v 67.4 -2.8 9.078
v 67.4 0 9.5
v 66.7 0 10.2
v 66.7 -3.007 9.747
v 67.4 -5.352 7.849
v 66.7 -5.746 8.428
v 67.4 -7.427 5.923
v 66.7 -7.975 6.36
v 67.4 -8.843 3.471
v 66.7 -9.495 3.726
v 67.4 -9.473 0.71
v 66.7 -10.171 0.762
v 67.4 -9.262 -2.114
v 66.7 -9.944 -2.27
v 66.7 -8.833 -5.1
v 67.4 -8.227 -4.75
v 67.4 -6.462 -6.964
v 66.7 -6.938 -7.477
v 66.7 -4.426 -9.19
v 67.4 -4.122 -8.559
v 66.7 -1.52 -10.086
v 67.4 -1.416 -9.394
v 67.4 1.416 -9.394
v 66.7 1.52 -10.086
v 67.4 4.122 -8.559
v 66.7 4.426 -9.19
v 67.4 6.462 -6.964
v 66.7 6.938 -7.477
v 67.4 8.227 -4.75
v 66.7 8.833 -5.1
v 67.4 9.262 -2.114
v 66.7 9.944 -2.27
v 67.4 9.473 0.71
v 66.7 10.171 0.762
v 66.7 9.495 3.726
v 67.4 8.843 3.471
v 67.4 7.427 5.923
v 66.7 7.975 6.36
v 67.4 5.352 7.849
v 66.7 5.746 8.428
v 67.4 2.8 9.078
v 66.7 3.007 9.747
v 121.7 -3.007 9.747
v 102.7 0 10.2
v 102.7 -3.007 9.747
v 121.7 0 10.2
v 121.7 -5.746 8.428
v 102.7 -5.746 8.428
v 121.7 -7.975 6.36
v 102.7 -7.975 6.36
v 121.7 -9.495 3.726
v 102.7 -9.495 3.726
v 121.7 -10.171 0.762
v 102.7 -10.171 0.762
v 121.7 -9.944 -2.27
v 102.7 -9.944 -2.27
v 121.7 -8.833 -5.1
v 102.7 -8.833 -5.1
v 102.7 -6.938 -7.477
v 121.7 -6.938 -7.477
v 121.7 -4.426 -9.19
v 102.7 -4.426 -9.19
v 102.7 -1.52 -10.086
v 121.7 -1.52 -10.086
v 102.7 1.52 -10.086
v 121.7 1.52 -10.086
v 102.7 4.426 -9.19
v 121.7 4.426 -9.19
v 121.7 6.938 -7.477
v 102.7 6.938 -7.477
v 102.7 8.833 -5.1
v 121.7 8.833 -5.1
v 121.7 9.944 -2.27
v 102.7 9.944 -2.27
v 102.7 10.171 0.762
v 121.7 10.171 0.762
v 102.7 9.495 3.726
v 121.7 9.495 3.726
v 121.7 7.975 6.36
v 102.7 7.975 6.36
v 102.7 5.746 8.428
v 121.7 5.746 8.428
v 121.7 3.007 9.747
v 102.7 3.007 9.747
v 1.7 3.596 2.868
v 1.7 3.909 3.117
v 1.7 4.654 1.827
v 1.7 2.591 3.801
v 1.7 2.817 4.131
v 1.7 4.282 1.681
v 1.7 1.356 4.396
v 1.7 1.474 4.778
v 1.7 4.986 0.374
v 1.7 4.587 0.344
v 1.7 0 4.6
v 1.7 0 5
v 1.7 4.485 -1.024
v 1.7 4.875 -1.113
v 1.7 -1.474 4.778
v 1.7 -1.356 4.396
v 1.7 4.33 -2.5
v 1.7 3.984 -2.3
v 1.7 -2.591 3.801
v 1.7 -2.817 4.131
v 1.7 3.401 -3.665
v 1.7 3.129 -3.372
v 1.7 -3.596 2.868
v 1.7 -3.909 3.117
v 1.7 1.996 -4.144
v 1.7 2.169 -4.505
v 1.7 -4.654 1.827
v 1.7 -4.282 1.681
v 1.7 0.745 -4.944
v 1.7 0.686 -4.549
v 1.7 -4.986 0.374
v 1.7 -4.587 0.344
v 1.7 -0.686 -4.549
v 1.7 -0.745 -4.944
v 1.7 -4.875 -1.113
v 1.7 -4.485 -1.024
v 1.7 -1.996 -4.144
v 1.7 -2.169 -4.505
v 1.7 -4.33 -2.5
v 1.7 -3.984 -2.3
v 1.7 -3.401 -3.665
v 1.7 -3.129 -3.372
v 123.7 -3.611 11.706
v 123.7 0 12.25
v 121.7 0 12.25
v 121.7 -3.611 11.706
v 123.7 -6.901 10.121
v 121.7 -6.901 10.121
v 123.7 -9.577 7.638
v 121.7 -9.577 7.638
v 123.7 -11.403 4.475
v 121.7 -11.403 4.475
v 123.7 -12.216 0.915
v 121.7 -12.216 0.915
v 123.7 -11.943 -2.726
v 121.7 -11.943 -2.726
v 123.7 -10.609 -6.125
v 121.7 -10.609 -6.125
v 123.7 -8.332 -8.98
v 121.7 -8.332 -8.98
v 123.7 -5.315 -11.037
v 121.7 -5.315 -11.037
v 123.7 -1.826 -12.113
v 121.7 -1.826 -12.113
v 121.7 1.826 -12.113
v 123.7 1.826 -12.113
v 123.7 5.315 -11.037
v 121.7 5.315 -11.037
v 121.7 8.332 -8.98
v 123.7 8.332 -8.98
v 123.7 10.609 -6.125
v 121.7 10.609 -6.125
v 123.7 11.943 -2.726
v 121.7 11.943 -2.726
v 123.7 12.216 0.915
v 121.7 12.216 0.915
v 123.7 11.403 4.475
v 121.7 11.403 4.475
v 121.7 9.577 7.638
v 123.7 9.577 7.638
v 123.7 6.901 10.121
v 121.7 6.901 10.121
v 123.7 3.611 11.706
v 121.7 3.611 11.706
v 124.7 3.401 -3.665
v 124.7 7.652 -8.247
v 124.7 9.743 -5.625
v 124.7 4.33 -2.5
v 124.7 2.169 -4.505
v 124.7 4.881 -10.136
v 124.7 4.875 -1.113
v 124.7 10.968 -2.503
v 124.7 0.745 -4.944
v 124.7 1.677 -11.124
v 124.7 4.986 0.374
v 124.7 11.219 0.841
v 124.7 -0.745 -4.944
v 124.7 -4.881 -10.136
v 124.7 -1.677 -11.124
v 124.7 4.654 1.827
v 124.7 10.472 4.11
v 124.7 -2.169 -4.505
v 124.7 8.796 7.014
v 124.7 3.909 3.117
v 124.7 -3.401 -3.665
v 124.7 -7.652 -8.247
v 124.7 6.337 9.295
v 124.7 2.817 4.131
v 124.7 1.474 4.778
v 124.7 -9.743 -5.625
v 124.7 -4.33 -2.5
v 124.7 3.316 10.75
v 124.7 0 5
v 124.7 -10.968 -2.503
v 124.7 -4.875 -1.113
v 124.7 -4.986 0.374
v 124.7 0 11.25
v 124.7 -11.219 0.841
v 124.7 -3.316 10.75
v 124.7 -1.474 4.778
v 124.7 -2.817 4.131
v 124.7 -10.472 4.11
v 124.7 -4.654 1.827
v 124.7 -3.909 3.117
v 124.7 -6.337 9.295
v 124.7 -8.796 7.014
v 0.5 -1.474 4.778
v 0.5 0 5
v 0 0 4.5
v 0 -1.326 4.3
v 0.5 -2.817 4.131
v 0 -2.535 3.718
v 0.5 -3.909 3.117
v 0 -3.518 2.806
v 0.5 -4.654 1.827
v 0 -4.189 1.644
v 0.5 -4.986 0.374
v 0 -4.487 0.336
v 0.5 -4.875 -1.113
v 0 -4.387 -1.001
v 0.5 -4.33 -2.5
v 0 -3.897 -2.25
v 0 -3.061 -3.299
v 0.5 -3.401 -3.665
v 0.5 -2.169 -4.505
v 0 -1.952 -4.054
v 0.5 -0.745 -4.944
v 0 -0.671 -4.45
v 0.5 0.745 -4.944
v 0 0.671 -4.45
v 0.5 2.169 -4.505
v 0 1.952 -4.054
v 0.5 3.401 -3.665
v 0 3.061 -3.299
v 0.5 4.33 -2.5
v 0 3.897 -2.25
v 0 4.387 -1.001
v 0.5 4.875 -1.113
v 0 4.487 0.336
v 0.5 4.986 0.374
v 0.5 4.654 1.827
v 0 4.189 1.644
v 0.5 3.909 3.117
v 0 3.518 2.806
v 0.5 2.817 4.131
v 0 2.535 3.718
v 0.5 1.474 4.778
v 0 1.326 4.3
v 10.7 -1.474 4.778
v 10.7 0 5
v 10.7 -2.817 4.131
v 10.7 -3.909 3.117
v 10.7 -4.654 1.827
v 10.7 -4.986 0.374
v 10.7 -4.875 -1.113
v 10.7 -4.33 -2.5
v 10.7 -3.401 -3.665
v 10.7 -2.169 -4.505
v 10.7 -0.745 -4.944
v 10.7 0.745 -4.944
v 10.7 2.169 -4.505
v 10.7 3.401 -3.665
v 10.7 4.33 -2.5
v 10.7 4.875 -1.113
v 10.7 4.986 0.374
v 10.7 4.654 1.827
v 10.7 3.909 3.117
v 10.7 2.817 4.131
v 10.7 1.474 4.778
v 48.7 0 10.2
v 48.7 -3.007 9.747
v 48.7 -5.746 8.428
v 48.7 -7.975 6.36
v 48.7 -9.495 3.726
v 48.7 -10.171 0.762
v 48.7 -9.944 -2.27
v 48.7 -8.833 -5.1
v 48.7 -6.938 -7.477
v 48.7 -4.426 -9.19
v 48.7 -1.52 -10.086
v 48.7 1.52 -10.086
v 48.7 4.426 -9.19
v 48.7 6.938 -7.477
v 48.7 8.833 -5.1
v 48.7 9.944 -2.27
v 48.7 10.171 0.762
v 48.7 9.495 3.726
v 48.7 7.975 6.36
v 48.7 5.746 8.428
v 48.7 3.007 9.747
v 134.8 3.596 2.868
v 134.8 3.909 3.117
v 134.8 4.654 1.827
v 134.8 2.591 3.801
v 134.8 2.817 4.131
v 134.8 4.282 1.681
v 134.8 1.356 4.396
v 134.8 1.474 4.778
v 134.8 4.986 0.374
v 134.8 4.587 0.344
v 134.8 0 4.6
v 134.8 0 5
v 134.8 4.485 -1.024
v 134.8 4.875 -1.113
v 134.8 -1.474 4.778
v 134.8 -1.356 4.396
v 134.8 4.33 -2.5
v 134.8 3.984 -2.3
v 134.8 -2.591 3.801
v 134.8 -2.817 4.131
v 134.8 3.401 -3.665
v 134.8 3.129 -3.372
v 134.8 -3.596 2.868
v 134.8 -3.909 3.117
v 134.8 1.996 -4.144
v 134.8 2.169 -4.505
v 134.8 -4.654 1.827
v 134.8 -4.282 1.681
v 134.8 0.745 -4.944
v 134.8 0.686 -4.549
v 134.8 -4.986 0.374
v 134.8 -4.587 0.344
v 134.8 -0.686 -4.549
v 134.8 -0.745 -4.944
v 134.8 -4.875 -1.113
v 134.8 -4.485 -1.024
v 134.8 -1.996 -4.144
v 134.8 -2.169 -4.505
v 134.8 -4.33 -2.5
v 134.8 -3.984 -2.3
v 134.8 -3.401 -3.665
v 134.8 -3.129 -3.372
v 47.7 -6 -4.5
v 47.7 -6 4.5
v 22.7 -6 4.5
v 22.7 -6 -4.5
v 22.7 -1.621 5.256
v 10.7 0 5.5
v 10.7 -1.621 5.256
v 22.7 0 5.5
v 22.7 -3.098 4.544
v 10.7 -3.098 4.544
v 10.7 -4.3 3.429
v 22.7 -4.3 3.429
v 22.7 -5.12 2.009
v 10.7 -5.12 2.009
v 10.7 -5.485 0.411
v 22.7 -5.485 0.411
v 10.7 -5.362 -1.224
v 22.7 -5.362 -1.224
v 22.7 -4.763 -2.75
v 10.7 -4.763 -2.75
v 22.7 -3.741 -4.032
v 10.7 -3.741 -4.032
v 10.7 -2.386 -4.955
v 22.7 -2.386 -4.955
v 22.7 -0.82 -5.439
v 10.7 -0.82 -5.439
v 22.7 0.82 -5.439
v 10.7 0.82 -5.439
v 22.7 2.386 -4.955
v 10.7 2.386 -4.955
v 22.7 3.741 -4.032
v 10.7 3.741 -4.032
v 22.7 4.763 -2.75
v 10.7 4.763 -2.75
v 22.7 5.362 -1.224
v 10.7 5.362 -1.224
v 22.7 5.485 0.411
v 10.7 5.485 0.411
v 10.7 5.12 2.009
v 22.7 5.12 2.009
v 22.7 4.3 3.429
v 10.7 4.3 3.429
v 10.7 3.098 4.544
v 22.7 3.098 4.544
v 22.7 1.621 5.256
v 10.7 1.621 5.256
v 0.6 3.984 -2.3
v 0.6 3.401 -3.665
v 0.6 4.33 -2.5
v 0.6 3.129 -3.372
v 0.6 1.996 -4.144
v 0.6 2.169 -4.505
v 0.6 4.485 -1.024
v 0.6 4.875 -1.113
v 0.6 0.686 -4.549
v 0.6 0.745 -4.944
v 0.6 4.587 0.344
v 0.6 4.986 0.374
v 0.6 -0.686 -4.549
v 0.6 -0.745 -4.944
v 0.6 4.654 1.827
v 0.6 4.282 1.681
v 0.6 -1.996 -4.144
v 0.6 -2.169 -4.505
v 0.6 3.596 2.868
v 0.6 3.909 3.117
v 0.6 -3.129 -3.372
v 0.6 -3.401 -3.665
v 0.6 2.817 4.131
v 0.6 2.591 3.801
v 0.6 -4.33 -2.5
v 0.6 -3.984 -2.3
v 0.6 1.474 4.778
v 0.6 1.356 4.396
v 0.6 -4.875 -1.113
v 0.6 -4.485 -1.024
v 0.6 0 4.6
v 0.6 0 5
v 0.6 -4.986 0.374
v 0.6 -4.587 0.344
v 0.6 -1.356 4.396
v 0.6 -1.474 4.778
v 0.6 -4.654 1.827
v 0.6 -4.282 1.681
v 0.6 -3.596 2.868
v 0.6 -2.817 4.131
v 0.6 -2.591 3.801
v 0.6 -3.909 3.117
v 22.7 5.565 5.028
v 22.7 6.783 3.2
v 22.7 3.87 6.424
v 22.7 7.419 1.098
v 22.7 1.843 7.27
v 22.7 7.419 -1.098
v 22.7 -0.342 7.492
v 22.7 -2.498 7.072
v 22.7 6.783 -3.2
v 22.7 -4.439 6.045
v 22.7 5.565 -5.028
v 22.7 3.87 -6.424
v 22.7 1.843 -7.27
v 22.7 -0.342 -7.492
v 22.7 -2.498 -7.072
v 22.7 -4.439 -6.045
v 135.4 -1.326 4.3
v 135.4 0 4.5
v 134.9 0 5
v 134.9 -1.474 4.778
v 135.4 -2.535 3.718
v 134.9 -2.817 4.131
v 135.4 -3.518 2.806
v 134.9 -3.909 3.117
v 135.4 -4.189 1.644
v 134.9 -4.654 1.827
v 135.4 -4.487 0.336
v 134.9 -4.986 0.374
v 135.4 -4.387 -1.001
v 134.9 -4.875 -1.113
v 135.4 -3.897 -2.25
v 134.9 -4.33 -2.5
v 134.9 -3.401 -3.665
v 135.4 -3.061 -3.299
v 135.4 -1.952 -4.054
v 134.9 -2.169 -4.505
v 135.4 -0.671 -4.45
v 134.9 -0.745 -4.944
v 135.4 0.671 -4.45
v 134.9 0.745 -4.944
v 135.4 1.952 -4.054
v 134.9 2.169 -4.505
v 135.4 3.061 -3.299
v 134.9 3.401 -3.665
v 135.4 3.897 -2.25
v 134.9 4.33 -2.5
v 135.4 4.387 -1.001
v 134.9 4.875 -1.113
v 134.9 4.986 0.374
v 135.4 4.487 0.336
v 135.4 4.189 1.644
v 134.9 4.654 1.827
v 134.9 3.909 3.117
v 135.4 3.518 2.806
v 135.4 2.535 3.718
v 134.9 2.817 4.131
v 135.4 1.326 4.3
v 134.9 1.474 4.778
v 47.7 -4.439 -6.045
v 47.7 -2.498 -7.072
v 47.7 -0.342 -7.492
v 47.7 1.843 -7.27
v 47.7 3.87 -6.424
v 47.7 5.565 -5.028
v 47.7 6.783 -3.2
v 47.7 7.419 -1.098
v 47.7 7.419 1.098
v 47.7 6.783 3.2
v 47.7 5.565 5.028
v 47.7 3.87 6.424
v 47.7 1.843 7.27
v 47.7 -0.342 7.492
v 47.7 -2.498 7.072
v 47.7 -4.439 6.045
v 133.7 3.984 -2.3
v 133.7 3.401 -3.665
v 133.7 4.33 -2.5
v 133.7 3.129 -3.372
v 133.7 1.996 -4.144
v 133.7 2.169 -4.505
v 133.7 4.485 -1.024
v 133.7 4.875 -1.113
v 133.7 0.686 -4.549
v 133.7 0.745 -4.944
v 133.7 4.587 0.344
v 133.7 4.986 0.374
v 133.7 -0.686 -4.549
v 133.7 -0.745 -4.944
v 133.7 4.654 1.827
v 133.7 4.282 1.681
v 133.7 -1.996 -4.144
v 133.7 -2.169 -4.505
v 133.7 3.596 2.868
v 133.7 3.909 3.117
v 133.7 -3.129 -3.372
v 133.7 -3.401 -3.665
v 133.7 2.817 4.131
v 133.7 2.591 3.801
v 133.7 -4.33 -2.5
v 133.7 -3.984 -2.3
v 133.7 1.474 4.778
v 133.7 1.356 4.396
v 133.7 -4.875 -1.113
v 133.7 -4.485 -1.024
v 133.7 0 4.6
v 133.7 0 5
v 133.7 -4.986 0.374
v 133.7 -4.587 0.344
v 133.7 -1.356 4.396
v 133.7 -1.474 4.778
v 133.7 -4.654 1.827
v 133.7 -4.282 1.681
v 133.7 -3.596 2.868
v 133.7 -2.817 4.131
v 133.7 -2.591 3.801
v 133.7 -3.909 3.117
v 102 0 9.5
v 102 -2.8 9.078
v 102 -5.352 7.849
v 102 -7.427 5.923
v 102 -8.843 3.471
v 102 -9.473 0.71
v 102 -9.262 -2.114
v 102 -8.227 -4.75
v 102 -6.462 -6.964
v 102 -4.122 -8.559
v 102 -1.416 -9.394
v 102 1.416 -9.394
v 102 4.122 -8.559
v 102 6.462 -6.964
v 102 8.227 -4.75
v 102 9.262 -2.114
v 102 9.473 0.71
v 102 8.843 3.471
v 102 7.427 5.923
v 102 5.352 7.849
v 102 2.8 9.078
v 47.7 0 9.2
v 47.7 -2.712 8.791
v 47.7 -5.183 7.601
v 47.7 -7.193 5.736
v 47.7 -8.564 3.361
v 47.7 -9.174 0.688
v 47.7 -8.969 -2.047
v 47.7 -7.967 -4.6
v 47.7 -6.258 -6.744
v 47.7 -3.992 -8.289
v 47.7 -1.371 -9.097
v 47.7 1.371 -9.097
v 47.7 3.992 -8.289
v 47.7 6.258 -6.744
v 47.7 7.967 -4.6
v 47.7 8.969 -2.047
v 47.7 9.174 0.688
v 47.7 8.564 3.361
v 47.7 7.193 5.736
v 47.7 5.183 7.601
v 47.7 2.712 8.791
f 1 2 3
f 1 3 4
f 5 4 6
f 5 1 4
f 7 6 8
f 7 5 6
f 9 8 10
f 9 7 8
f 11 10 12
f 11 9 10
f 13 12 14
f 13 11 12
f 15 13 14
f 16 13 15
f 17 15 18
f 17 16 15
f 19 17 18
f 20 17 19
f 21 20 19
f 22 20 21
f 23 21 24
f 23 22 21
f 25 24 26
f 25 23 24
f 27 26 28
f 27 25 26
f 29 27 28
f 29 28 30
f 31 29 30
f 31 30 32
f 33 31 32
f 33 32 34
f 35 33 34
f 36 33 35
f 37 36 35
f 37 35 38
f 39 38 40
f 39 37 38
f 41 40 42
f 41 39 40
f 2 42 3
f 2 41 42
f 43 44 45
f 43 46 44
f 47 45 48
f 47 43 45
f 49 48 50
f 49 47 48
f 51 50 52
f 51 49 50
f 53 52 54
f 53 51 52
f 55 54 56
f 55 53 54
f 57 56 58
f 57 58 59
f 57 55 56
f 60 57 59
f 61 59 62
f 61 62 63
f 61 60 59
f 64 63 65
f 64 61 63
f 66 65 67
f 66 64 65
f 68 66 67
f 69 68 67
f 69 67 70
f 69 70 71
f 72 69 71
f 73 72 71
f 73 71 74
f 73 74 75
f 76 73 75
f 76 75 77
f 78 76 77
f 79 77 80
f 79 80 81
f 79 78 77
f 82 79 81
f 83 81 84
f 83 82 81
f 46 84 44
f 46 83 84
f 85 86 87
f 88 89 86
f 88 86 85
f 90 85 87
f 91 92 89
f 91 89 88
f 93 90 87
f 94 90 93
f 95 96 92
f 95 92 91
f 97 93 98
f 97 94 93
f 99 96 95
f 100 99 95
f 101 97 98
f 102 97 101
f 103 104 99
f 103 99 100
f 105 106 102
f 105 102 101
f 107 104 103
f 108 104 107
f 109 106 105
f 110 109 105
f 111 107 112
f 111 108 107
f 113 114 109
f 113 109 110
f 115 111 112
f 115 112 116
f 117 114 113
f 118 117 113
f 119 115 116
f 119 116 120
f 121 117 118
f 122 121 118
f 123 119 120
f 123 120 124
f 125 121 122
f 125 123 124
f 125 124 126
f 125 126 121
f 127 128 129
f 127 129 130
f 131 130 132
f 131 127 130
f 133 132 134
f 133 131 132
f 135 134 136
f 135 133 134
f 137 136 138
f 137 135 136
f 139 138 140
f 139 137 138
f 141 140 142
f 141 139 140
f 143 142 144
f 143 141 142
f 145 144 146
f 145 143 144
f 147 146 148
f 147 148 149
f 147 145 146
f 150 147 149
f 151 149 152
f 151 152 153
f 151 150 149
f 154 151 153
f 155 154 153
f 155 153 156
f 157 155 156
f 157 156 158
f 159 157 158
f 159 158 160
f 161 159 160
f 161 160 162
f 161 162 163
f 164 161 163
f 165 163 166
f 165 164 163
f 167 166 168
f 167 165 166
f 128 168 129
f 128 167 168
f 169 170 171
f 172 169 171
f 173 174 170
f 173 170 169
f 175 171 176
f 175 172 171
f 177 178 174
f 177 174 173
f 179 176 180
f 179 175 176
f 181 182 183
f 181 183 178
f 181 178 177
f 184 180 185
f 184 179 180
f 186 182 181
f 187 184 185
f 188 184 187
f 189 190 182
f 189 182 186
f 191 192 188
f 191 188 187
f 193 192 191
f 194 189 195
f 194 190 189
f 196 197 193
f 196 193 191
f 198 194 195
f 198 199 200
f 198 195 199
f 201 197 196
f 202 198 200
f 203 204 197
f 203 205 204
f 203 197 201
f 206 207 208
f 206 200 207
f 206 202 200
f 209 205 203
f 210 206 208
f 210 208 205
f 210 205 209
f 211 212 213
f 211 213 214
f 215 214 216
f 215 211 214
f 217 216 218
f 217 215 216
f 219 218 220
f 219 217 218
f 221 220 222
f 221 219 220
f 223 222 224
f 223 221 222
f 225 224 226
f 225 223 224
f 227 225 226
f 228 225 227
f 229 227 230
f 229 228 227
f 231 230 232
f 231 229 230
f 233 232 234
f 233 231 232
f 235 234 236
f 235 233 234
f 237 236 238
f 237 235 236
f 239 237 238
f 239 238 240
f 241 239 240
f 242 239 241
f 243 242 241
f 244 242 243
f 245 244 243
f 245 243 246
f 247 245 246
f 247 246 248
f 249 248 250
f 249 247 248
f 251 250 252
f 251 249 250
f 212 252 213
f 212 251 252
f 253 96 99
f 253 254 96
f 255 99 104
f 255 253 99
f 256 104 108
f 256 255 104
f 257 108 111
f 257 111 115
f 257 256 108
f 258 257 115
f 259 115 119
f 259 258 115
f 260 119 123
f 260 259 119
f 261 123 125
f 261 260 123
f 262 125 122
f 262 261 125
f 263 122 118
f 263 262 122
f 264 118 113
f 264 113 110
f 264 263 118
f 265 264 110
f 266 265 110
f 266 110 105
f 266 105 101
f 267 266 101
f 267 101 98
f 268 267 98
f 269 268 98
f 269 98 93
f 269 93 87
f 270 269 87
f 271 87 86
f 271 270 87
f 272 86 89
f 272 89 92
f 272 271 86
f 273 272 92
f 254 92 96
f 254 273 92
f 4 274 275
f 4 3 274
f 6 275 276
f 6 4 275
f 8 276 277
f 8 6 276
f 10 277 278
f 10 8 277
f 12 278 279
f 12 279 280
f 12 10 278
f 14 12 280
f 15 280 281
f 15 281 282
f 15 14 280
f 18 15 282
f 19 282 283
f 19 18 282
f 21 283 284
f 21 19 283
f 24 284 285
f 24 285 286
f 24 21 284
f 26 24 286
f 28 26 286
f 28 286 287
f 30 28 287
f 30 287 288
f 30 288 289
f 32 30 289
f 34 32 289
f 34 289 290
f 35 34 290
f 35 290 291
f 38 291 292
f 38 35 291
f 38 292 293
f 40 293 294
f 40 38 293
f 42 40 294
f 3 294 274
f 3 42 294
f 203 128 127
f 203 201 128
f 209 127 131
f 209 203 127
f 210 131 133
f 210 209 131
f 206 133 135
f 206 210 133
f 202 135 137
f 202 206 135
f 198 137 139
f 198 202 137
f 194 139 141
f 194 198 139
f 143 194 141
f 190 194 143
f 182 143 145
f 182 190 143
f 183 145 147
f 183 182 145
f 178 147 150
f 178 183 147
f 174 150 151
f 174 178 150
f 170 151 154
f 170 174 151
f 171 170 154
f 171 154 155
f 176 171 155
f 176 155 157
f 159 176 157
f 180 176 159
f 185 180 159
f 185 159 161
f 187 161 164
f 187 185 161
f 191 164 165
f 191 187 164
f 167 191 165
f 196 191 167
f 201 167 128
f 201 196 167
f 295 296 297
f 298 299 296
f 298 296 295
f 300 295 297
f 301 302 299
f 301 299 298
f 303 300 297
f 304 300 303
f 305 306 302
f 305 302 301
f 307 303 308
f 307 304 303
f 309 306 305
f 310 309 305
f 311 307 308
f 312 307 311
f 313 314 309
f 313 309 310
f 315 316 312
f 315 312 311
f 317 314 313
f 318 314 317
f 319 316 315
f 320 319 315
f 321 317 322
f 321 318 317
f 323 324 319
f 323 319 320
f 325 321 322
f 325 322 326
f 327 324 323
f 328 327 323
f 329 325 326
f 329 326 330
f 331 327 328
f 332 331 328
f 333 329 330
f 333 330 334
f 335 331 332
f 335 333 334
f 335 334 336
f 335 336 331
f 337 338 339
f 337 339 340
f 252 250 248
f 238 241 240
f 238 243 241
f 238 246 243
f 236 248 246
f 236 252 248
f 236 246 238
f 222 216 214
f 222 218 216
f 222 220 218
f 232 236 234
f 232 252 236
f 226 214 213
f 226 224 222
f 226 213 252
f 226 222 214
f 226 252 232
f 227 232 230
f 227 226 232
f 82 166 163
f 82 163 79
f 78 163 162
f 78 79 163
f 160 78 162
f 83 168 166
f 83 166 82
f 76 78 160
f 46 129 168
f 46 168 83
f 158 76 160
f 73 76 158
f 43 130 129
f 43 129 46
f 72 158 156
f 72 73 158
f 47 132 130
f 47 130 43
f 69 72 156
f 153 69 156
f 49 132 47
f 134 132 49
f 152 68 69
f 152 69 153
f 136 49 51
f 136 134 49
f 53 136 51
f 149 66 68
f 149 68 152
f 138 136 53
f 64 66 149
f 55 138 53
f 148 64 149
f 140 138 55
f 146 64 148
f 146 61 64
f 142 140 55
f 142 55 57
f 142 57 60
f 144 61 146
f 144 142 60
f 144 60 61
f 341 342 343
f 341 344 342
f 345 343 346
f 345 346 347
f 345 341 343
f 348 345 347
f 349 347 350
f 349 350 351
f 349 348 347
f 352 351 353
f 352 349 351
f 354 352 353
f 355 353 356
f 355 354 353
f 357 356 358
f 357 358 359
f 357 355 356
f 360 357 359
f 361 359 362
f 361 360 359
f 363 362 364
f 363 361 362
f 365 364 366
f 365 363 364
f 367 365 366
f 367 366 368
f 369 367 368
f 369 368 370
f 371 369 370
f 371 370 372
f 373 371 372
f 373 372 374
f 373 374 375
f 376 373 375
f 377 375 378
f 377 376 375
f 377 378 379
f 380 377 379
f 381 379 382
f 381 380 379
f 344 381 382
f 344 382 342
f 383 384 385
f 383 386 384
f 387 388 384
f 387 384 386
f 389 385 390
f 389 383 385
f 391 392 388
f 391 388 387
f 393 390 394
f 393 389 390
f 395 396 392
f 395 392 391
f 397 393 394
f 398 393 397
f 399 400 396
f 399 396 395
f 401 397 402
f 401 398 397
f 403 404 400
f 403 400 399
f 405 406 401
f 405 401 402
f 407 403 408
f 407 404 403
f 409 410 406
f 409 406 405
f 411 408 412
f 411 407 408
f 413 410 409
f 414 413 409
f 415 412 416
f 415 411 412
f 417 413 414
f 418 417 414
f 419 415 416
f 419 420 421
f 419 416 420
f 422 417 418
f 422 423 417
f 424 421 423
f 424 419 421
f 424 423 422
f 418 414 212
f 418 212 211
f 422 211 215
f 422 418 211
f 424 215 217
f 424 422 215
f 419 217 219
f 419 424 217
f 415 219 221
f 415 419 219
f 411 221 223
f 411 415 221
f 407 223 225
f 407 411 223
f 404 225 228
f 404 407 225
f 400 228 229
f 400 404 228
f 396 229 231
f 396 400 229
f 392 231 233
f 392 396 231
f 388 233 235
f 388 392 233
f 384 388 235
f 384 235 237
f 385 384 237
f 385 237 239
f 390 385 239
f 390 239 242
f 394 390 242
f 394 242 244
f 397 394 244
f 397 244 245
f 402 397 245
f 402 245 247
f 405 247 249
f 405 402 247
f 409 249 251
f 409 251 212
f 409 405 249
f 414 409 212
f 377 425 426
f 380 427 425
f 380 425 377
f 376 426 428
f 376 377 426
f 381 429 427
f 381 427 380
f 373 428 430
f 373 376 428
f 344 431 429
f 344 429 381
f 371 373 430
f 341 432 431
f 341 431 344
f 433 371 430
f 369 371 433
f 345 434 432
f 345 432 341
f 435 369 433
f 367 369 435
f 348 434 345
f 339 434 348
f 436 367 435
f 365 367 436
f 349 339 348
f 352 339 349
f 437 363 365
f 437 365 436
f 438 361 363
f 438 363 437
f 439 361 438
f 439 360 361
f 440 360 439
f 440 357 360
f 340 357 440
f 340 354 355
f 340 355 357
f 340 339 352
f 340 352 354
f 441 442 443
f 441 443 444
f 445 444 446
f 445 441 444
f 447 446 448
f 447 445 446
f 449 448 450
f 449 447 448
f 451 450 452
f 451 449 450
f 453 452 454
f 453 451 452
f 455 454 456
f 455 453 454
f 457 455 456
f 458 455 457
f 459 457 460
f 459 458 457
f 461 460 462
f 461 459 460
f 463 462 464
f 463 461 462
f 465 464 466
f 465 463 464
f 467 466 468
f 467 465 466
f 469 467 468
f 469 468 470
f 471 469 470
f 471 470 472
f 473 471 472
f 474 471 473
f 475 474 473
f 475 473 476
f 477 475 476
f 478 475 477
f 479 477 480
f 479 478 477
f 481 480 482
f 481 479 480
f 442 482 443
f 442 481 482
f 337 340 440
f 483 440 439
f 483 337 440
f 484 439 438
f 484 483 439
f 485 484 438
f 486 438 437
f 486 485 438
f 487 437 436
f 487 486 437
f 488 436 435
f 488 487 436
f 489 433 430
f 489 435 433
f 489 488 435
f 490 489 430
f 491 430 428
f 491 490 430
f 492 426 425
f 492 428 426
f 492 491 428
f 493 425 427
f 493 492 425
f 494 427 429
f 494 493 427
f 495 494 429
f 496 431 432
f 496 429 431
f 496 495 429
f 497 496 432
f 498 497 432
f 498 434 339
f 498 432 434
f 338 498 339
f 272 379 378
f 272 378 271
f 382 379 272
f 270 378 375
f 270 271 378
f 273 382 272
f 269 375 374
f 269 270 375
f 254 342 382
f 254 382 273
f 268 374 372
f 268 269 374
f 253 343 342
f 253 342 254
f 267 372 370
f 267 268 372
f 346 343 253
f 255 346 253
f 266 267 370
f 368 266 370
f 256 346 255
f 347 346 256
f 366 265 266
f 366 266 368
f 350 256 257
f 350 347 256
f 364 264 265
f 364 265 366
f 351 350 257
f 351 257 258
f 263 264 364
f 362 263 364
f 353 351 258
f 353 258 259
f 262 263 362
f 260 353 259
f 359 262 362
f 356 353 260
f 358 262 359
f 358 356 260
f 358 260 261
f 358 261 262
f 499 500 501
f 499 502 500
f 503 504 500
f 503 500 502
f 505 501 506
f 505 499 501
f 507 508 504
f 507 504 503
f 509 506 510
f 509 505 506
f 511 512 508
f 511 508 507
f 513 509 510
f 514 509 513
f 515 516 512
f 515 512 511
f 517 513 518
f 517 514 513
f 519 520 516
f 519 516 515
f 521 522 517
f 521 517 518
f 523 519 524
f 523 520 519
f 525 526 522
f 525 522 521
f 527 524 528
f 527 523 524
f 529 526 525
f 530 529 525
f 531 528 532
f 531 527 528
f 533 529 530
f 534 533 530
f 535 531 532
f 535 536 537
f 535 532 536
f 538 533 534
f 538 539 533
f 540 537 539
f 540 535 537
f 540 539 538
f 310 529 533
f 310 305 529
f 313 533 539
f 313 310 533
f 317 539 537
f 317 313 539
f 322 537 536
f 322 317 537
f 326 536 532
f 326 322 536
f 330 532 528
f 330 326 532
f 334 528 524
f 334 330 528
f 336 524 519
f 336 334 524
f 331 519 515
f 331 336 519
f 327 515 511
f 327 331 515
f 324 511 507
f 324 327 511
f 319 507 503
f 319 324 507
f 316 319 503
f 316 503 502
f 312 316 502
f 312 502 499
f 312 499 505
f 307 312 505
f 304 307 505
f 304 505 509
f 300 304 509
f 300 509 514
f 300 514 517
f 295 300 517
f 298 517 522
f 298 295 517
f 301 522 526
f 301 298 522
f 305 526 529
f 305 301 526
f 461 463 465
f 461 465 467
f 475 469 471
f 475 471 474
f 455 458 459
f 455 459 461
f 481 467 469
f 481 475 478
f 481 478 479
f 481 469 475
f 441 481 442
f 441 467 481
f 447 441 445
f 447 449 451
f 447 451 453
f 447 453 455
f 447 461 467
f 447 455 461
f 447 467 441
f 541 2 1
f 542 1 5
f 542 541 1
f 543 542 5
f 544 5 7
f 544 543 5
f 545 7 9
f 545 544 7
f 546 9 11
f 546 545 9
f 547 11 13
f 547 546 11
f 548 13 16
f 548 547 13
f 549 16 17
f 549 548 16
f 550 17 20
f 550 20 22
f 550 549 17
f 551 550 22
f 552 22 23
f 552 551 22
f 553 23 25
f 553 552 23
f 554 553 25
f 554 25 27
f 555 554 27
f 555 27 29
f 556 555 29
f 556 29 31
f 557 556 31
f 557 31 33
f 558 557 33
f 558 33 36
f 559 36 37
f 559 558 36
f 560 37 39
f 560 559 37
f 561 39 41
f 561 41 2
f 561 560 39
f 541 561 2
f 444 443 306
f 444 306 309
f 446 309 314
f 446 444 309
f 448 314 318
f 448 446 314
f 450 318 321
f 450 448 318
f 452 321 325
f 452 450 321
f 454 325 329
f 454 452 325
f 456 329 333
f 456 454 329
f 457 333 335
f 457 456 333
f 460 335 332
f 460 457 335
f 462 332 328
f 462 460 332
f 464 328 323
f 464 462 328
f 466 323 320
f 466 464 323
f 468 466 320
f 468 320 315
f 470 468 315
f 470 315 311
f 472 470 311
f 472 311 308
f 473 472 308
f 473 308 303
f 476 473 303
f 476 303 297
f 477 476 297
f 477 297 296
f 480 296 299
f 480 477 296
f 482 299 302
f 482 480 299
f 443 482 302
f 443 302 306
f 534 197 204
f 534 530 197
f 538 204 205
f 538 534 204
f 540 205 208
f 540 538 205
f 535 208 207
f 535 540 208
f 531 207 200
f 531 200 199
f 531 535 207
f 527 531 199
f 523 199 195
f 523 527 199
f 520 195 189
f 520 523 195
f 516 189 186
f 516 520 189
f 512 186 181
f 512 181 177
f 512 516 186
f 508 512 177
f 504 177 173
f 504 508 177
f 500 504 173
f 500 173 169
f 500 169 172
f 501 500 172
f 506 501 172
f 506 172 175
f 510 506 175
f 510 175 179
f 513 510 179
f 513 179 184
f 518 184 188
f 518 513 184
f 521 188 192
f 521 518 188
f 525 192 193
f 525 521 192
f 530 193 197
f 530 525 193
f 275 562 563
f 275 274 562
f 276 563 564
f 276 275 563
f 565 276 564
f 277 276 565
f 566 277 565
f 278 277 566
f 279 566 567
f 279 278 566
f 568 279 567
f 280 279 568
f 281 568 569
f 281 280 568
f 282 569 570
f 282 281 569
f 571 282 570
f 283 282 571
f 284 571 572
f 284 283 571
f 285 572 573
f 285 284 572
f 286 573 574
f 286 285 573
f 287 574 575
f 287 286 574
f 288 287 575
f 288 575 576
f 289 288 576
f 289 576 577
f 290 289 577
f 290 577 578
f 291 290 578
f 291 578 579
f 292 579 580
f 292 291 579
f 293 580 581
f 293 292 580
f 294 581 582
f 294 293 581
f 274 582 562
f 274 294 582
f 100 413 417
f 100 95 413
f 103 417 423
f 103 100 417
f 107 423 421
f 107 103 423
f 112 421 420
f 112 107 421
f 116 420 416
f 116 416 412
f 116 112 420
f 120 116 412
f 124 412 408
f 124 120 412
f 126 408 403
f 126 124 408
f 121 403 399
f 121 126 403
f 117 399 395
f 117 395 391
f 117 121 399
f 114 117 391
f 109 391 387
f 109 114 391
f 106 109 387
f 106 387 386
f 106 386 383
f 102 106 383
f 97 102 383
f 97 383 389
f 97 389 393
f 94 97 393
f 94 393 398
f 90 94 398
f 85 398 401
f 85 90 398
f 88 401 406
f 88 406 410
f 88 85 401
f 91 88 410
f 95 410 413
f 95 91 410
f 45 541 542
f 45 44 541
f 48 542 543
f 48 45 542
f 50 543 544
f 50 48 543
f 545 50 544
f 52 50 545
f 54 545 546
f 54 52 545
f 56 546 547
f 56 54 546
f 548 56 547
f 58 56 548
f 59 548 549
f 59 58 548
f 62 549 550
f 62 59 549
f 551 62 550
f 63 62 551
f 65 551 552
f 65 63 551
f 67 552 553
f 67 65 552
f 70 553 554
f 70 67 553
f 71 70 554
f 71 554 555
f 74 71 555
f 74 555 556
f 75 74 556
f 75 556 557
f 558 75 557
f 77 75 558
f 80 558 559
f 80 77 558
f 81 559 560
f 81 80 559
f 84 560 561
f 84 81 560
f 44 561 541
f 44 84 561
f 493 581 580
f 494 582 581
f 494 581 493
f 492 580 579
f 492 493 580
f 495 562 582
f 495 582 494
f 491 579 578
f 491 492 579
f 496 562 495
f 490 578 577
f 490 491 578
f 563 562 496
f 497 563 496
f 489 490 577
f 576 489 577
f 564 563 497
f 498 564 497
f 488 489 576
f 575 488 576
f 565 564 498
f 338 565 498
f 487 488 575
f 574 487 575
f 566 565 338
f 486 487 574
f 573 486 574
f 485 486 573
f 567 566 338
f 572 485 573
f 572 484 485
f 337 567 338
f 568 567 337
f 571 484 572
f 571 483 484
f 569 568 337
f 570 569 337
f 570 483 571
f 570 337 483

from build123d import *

# Parameters (mm, degrees)
SFAZOWANIE1_SIZE           = 1
SFAZOWANIE2_SIZE           = 0.5
WYTNIJ_WYCI_GNI_CIE1_START = -25
WYTNIJ_WYCI_GNI_CIE1_DEPTH = 25


with BuildPart() as part:
    # Szkic1 → Obrót1 (revolve)
    with BuildSketch(Plane.XY, mode=Mode.PRIVATE) as obr_t1_sk:
        Polygon((0, 0), (0, 5), (0.6, 5), (0.6, 4.6), (1.7, 4.6), (1.7, 5), (10.7, 5), (10.7, 5.5), (22.7, 5.5), (22.7, 7.5), (47.7, 7.5), (47.7, 10.2), (67.7, 10.2), (67.7, 9.5), (101.7, 9.5), (101.7, 10.2), (121.7, 10.2), (121.7, 12.25), (124.7, 12.25), (124.7, 5), (133.7, 5), (133.7, 4.6), (134.8, 4.6), (134.8, 5), (135.4, 5), (135.4, 0), align=None)
    revolve(obr_t1_sk.sketch.rotate(Axis((-10.674656103, 0, 0), (1, 0, 0)), 90), axis=Axis((-10.674656103, 0, 0), (1, 0, 0)))

    # Sfazowanie1
    # the kernel refuses this chamfer: 1 mm, written as the material it takes off along each edge
    with BuildSketch(Plane(origin=(101.7, 0, 0), x_dir=(0, 0, 1), z_dir=(0, 1, 0))) as sfazowanie1_piece_1_section:
        Polygon((10.2 - SFAZOWANIE1_SIZE, 0), (10.2, SFAZOWANIE1_SIZE), (10.2, 0), align=None)
    sfazowanie1_piece_1 = revolve(axis=Axis((101.7, 0, 0), (1, 0, 0)), mode=Mode.PRIVATE)
    sfazowanie1_piece_1 = sfazowanie1_piece_1 - Plane(origin=(102.341981052, 0, 0), x_dir=(0, 0, 1), z_dir=(1, 0, 0)) * Cylinder(9.5, 41, mode=Mode.PRIVATE)
    add(sfazowanie1_piece_1, mode=Mode.SUBTRACT)
    with BuildSketch(Plane(origin=(67.7, 0, 0), x_dir=(0, 0, 1), z_dir=(0, 1, 0))) as sfazowanie1_piece_2_section:
        Polygon((10.2, -SFAZOWANIE1_SIZE), (10.2 - SFAZOWANIE1_SIZE, 0), (10.2, 0), align=None)
    sfazowanie1_piece_2 = revolve(axis=Axis((67.7, 0, 0), (1, 0, 0)), mode=Mode.PRIVATE)
    sfazowanie1_piece_2 = sfazowanie1_piece_2 - Plane(origin=(67.058018948, 0, 0), x_dir=(0, 0, 1), z_dir=(1, 0, 0)) * Cylinder(9.5, 41, mode=Mode.PRIVATE)
    add(sfazowanie1_piece_2, mode=Mode.SUBTRACT)
    with BuildSketch(Plane(origin=(124.7, 0, 0), x_dir=(0, 0, 1), z_dir=(0, 1, 0))) as sfazowanie1_piece_3:
        Polygon((12.25, -SFAZOWANIE1_SIZE), (12.25 - SFAZOWANIE1_SIZE, 0), (12.25, 0), align=None)
    revolve(axis=Axis((124.7, 0, 0), (1, 0, 0)), mode=Mode.SUBTRACT)
    with BuildSketch(Plane(origin=(47.7, 0, 0), x_dir=(0, 0, 1), z_dir=(0, 1, 0))) as sfazowanie1_piece_4:
        Polygon((10.2 - SFAZOWANIE1_SIZE, 0), (10.2, SFAZOWANIE1_SIZE), (10.2, 0), align=None)
    revolve(axis=Axis((47.7, 0, 0), (1, 0, 0)), mode=Mode.SUBTRACT)

    # Sfazowanie2
    sfazowanie2_edges = [part.edges().sort_by_distance(p)[0] for p in [
        (135.4, 0, -5),
        (0, 0, -5),
    ]]
    chamfer(sfazowanie2_edges, length=SFAZOWANIE2_SIZE)

    # Szkic2 → Wytnij-wyciągnięcie1 (cut)
    with BuildSketch(Plane.ZY.offset(-22.7).offset(WYTNIJ_WYCI_GNI_CIE1_START)):
        with BuildLine():
            Line((4.5, -6), (-4.5, -6))
            ThreePointArc((-4.5, -6), (0, -7.5), (4.5, -6))
        make_face()
    extrude(amount=WYTNIJ_WYCI_GNI_CIE1_DEPTH, mode=Mode.SUBTRACT)


solid = part.part
